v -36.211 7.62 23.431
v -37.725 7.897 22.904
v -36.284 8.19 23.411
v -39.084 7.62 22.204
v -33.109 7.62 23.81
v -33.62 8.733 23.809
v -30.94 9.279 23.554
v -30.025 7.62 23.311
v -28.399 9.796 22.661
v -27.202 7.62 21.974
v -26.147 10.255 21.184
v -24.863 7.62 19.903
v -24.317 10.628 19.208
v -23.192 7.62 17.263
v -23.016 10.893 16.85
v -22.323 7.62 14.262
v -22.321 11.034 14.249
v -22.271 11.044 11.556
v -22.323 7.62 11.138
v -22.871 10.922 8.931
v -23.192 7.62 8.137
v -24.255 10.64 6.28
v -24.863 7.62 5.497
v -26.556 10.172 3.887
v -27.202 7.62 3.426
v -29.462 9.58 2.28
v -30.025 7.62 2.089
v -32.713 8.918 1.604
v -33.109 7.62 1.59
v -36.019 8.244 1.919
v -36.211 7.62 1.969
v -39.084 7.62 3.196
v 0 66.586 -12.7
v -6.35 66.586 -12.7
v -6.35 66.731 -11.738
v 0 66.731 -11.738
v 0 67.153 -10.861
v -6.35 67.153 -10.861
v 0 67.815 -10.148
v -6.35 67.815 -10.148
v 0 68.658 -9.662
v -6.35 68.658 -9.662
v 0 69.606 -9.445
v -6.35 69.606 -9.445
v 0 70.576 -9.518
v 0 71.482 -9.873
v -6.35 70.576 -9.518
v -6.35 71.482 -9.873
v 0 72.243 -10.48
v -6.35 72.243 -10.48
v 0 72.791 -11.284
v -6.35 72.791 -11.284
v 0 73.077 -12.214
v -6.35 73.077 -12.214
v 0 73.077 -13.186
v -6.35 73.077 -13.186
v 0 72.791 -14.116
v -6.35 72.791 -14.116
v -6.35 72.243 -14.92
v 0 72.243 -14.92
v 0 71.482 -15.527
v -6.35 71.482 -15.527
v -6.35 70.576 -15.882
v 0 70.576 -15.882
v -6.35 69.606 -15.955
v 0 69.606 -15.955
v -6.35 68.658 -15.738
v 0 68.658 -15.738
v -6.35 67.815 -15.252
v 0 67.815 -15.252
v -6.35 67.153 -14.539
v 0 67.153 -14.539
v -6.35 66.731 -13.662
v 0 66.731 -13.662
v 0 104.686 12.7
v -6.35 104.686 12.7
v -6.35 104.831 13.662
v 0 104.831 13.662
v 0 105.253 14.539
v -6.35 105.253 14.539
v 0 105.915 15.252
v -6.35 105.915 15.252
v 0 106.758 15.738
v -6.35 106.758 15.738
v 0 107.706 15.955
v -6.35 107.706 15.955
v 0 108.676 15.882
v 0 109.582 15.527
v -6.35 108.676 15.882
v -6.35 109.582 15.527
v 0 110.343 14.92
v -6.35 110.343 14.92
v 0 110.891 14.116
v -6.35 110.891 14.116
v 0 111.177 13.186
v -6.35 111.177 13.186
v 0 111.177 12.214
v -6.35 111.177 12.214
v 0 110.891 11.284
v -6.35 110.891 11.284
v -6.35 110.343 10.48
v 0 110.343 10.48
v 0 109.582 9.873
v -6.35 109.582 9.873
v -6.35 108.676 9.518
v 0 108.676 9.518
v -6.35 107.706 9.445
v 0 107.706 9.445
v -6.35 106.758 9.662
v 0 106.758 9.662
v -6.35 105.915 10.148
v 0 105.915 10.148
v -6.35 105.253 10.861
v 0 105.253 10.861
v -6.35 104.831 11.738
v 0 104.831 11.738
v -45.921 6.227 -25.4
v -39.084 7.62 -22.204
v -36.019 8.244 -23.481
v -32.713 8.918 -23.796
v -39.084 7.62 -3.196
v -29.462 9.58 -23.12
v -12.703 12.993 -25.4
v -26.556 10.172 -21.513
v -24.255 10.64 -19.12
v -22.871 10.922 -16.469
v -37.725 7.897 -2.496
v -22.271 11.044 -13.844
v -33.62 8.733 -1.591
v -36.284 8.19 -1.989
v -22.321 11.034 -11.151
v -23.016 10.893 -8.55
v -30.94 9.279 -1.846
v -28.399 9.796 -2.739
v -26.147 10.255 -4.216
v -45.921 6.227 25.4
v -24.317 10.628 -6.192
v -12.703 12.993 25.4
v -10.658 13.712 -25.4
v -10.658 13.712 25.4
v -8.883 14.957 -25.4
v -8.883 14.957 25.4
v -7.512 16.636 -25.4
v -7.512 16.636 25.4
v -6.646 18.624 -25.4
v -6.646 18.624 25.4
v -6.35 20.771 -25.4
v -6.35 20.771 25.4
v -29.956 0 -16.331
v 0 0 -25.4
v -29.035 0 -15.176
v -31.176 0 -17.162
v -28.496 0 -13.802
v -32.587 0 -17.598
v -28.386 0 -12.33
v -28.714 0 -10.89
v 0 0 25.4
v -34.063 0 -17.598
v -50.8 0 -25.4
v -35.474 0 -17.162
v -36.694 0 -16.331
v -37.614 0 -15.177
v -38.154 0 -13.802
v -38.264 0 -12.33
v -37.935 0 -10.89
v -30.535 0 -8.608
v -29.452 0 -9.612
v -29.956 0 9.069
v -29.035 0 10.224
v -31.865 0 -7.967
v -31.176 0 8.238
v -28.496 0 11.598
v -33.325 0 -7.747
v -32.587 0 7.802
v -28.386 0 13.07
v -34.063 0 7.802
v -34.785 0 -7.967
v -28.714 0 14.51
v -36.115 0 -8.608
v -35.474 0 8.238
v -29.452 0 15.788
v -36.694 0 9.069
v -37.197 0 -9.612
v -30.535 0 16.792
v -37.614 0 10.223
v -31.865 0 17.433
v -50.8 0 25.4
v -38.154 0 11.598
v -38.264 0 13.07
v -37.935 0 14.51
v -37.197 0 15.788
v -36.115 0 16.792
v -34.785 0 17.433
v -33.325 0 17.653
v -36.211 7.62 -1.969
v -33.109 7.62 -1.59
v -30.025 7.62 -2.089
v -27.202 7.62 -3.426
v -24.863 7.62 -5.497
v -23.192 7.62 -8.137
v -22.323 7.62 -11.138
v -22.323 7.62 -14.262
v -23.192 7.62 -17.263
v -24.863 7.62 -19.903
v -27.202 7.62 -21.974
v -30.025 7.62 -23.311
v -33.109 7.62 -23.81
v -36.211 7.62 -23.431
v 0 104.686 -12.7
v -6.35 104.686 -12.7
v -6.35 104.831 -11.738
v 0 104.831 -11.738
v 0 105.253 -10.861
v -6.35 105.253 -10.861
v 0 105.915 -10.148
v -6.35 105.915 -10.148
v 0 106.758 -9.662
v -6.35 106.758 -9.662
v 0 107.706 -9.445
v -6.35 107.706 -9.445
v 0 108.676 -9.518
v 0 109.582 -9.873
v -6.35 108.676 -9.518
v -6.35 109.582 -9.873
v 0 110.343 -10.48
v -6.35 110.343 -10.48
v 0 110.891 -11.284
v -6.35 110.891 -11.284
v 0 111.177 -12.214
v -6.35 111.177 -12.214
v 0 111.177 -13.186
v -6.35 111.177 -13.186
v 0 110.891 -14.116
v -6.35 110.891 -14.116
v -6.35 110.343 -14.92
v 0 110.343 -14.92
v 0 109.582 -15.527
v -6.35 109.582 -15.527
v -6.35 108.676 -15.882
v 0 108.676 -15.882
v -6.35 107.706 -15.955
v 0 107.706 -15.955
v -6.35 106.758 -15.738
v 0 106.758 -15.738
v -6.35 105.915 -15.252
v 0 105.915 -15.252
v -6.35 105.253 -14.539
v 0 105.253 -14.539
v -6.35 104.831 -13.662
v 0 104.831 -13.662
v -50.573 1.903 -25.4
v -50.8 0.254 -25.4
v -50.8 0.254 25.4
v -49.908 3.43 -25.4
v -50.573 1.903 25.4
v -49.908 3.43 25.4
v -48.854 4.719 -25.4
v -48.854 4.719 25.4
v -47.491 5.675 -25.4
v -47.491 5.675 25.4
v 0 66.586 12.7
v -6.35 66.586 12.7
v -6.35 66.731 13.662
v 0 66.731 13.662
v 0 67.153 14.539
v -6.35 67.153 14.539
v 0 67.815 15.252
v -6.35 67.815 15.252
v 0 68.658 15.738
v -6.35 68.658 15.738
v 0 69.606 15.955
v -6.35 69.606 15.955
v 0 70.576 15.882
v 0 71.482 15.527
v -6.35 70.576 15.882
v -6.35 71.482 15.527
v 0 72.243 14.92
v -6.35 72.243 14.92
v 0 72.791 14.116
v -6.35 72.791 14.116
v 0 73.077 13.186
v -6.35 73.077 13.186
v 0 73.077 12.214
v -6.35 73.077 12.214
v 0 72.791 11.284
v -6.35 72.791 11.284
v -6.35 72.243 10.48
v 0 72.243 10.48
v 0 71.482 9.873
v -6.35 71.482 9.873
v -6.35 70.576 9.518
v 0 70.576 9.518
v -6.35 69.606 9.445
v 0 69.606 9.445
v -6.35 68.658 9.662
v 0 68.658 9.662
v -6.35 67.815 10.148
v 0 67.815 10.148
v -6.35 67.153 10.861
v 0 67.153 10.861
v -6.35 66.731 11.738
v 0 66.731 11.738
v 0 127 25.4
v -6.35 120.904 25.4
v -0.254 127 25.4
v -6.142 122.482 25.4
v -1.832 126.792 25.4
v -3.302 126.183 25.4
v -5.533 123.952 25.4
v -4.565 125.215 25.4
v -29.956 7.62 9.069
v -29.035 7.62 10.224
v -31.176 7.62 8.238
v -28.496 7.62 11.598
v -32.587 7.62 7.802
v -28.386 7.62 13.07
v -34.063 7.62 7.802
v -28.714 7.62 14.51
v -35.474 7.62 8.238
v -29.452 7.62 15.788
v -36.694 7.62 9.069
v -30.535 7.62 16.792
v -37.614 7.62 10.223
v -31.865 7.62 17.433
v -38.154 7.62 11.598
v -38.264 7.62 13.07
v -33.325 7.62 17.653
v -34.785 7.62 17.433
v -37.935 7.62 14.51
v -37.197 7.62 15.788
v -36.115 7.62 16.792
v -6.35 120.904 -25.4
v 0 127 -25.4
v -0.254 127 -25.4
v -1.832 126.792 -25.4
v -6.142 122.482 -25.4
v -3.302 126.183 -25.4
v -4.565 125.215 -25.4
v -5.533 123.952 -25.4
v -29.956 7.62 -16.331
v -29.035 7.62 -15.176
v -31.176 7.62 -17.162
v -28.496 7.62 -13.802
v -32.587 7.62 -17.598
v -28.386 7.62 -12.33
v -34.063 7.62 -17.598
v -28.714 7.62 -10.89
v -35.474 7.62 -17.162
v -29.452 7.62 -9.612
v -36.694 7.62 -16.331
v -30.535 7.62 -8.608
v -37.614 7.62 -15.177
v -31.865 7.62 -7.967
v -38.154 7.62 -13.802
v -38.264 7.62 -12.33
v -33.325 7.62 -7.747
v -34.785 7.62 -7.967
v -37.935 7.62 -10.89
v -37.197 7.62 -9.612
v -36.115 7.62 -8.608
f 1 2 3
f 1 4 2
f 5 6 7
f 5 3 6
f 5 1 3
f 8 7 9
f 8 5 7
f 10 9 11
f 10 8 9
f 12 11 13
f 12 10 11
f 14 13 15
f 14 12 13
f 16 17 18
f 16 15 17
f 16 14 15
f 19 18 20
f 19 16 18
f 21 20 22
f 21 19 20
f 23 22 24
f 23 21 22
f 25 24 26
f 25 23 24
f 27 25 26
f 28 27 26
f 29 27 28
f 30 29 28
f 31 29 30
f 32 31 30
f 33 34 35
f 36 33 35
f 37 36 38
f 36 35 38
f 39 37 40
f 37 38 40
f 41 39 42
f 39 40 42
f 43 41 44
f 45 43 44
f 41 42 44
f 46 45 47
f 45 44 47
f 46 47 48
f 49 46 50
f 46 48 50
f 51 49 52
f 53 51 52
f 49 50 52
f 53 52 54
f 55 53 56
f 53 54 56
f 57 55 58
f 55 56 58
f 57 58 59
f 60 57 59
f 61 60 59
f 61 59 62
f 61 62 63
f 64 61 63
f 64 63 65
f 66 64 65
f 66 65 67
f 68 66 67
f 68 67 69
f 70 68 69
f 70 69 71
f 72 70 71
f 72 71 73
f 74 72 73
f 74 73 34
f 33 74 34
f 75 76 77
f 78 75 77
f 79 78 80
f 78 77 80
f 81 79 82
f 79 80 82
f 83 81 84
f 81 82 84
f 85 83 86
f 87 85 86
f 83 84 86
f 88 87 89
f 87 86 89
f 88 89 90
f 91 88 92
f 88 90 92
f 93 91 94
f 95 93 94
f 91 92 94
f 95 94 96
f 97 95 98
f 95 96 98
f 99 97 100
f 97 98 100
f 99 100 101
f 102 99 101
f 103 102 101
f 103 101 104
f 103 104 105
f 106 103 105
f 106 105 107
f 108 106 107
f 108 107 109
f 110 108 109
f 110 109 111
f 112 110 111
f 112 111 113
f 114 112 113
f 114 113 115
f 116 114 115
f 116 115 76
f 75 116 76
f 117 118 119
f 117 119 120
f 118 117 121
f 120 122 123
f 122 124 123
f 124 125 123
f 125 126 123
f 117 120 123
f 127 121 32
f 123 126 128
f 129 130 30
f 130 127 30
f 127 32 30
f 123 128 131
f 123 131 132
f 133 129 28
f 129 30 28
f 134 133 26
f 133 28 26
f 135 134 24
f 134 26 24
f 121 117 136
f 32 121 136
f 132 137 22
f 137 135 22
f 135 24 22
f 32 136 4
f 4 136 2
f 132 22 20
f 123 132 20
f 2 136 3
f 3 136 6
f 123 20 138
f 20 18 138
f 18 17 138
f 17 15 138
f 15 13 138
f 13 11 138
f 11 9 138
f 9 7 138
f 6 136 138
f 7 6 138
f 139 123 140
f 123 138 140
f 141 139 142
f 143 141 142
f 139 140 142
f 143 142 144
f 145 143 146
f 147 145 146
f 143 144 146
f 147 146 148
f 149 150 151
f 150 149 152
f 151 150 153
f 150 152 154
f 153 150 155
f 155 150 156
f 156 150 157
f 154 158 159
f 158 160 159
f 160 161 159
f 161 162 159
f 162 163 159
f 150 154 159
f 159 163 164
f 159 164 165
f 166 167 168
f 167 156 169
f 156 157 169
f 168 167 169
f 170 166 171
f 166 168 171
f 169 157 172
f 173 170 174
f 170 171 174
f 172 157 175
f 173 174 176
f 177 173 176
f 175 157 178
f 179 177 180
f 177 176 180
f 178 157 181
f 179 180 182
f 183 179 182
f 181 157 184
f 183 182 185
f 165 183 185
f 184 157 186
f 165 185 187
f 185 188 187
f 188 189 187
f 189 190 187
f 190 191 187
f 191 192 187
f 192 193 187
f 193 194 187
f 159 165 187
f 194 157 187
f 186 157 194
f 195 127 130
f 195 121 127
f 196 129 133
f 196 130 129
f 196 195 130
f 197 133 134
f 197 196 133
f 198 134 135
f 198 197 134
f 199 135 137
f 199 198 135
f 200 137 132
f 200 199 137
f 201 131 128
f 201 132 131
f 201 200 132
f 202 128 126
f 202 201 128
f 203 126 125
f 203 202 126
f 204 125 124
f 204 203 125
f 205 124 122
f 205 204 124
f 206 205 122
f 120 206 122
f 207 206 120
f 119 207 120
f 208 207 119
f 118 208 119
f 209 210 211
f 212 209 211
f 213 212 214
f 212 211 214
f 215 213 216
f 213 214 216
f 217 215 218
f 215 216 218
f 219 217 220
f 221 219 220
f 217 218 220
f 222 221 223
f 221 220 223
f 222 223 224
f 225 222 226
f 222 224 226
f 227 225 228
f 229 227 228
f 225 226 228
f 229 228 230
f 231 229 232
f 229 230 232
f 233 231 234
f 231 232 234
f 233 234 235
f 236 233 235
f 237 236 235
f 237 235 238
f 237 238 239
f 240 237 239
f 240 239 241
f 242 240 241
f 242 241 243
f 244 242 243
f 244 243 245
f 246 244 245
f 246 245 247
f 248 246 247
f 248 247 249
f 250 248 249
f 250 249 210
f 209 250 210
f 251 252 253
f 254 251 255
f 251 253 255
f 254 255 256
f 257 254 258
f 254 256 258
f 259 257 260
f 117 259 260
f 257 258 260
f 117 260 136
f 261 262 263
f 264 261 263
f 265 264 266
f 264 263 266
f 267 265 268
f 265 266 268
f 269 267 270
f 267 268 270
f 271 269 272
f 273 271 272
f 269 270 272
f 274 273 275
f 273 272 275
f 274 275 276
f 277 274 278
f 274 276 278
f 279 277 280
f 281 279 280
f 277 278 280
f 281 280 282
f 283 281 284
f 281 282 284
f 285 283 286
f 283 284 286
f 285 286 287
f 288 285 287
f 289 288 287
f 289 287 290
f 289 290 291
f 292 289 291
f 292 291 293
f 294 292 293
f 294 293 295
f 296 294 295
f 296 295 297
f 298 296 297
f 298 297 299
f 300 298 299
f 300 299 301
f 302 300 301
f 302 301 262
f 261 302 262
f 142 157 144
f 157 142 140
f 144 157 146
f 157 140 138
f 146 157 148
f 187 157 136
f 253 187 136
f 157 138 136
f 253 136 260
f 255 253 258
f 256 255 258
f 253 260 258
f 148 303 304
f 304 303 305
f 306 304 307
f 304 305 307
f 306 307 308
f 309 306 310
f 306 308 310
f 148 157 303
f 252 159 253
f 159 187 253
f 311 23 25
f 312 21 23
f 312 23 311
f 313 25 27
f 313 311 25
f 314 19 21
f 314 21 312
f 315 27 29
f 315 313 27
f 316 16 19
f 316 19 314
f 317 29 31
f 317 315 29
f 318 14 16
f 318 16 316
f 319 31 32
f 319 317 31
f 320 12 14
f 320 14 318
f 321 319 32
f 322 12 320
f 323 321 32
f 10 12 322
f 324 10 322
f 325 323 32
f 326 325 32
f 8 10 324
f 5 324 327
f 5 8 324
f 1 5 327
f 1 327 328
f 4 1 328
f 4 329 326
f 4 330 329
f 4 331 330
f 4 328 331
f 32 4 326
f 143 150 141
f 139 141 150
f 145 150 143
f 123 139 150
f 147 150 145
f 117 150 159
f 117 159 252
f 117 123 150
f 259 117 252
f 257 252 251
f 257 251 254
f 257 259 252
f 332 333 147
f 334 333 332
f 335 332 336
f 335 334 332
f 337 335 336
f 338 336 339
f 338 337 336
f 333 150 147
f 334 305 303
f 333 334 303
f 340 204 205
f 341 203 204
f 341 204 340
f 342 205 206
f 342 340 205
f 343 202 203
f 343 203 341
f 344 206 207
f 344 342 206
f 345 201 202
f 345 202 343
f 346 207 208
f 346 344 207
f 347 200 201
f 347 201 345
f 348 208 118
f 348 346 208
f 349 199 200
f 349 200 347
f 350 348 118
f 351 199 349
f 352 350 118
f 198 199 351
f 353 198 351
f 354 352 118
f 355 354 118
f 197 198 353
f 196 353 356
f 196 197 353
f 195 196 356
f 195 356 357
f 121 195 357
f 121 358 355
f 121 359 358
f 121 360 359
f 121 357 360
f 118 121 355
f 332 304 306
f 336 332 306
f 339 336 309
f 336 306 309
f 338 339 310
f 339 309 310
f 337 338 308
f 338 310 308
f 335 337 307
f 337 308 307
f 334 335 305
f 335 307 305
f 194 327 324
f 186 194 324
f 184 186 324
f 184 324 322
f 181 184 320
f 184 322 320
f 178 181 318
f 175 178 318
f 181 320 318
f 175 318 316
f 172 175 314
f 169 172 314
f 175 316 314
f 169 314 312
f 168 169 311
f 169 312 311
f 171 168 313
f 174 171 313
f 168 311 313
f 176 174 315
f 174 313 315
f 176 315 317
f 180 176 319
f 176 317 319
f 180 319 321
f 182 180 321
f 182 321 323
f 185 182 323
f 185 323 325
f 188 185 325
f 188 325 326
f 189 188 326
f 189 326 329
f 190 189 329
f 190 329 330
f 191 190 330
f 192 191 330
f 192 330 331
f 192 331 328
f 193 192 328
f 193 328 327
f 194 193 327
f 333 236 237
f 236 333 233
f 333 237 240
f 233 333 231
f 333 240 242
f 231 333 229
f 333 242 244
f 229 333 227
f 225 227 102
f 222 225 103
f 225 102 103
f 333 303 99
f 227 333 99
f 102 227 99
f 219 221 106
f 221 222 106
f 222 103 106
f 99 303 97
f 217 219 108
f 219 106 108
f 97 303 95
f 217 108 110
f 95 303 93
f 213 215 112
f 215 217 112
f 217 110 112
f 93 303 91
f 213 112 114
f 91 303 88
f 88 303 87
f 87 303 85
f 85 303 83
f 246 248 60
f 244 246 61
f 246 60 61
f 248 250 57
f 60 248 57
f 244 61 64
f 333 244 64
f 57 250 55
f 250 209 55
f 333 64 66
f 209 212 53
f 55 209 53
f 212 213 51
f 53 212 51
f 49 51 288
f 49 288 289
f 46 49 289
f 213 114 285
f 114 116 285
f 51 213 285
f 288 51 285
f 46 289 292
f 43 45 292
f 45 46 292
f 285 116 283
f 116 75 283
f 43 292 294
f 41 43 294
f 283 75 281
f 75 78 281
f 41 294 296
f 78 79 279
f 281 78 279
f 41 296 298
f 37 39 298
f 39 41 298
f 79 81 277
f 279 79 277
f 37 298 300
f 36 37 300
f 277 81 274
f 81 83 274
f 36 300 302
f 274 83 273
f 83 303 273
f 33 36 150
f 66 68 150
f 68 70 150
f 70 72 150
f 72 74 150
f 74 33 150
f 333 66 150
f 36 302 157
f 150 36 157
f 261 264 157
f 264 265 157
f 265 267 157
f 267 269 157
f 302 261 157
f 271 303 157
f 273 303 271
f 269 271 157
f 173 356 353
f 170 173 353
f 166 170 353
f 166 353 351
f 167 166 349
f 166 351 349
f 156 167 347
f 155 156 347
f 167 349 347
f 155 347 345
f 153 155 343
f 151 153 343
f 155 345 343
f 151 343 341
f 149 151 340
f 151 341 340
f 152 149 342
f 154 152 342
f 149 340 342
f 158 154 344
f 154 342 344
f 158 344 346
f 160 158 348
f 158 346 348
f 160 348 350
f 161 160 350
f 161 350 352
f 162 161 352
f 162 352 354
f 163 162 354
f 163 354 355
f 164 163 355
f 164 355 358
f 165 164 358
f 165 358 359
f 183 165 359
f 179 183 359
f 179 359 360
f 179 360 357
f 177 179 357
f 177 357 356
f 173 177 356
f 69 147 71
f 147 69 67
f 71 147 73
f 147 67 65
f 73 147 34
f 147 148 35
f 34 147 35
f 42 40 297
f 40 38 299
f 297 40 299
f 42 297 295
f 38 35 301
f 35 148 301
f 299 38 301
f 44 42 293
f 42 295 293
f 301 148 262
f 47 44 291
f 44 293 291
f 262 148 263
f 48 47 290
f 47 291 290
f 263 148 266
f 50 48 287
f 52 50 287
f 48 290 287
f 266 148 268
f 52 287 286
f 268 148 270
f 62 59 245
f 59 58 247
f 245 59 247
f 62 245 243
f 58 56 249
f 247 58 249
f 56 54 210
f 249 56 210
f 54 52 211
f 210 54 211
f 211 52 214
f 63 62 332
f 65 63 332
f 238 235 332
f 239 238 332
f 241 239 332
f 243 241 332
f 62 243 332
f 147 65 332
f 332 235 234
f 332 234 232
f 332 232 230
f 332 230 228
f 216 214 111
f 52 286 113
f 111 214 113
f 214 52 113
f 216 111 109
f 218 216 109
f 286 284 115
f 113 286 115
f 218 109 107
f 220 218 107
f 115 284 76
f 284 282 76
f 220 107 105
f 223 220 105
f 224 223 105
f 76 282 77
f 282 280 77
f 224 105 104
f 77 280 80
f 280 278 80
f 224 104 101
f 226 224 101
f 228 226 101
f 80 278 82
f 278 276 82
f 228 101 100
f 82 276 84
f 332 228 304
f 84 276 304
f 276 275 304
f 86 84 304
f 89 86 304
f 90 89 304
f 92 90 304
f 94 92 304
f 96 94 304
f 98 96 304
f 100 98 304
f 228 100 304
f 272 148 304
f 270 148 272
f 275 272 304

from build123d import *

# Parameters (mm, degrees)
EXTRUDE1_DEPTH     = 25.4
SKETCH11_R         = 11.1125
CUT_EXTRUDE4_DEPTH = 133.202058985
SKETCH12_R         = 4.953
CUT_EXTRUDE5_DEPTH = 133.202058985
SKETCH13_R         = 3.2639
CUT_EXTRUDE6_DEPTH = 137.930502446


with BuildPart() as part:
    # Sketch1 → Extrude1 (new, symmetric)
    with BuildSketch(Plane.XY):
        with BuildLine():
            Line((0, 127), (0, 0))
            Line((0, 0), (-50.8, 0))
            Line((-50.8, 0), (-50.8, 0.254))
            ThreePointArc((-50.8, 0.254), (-49.425137622, 4.11043301), (-45.920710119, 6.227343493))
            Line((-45.920710119, 6.227343493), (-12.703242032, 12.993408361))
            ThreePointArc((-12.703242032, 12.993408361), (-8.140185388, 15.74980222), (-6.35, 20.771199368))
            Line((-6.35, 20.771199368), (-6.35, 120.904))
            ThreePointArc((-6.35, 120.904), (-4.564522938, 125.214522938), (-0.254, 127))
            Line((-0.254, 127), (0, 127))
        make_face()
    extrude(amount=EXTRUDE1_DEPTH, both=True)

    # Sketch11 → Cut-Extrude4 (cut, through all)
    with BuildSketch(Plane(origin=(0, 7.62, 0), x_dir=(-1, 0, 0), z_dir=(0, 1, 0))):
        with Locations((33.3248, -12.7)):
            Circle(SKETCH11_R)
        with Locations((33.3248, 12.7)):
            Circle(SKETCH11_R)
    extrude(amount=CUT_EXTRUDE4_DEPTH, mode=Mode.SUBTRACT)

    # Sketch12 → Cut-Extrude5 (cut, through all)
    with BuildSketch(Plane(origin=(0, 7.62, 0), x_dir=(-1, 0, 0), z_dir=(0, 1, 0))):
        with Locations(Location((33.3248, 12.7, 0), (0, 0, 90))):
            Circle(SKETCH12_R)
        with Locations(Location((33.3248, -12.7, 0), (0, 0, 90))):
            Circle(SKETCH12_R)
    extrude(amount=-CUT_EXTRUDE5_DEPTH, mode=Mode.SUBTRACT)

    # Sketch13 → Cut-Extrude6 (cut, through all)
    with BuildSketch(Plane.ZY.offset(6.35)):
        with Locations(Location((-12.7, 69.85, 0), (0, 0, 270))):
            Circle(SKETCH13_R)
        with Locations(Location((-12.7, 107.95, 0), (0, 0, 270))):
            Circle(SKETCH13_R)
        with Locations(Location((12.7, 107.95, 0), (0, 0, 270))):
            Circle(SKETCH13_R)
        with Locations(Location((12.7, 69.85, 0), (0, 0, 270))):
            Circle(SKETCH13_R)
    extrude(amount=-CUT_EXTRUDE6_DEPTH, mode=Mode.SUBTRACT)


solid = part.part
